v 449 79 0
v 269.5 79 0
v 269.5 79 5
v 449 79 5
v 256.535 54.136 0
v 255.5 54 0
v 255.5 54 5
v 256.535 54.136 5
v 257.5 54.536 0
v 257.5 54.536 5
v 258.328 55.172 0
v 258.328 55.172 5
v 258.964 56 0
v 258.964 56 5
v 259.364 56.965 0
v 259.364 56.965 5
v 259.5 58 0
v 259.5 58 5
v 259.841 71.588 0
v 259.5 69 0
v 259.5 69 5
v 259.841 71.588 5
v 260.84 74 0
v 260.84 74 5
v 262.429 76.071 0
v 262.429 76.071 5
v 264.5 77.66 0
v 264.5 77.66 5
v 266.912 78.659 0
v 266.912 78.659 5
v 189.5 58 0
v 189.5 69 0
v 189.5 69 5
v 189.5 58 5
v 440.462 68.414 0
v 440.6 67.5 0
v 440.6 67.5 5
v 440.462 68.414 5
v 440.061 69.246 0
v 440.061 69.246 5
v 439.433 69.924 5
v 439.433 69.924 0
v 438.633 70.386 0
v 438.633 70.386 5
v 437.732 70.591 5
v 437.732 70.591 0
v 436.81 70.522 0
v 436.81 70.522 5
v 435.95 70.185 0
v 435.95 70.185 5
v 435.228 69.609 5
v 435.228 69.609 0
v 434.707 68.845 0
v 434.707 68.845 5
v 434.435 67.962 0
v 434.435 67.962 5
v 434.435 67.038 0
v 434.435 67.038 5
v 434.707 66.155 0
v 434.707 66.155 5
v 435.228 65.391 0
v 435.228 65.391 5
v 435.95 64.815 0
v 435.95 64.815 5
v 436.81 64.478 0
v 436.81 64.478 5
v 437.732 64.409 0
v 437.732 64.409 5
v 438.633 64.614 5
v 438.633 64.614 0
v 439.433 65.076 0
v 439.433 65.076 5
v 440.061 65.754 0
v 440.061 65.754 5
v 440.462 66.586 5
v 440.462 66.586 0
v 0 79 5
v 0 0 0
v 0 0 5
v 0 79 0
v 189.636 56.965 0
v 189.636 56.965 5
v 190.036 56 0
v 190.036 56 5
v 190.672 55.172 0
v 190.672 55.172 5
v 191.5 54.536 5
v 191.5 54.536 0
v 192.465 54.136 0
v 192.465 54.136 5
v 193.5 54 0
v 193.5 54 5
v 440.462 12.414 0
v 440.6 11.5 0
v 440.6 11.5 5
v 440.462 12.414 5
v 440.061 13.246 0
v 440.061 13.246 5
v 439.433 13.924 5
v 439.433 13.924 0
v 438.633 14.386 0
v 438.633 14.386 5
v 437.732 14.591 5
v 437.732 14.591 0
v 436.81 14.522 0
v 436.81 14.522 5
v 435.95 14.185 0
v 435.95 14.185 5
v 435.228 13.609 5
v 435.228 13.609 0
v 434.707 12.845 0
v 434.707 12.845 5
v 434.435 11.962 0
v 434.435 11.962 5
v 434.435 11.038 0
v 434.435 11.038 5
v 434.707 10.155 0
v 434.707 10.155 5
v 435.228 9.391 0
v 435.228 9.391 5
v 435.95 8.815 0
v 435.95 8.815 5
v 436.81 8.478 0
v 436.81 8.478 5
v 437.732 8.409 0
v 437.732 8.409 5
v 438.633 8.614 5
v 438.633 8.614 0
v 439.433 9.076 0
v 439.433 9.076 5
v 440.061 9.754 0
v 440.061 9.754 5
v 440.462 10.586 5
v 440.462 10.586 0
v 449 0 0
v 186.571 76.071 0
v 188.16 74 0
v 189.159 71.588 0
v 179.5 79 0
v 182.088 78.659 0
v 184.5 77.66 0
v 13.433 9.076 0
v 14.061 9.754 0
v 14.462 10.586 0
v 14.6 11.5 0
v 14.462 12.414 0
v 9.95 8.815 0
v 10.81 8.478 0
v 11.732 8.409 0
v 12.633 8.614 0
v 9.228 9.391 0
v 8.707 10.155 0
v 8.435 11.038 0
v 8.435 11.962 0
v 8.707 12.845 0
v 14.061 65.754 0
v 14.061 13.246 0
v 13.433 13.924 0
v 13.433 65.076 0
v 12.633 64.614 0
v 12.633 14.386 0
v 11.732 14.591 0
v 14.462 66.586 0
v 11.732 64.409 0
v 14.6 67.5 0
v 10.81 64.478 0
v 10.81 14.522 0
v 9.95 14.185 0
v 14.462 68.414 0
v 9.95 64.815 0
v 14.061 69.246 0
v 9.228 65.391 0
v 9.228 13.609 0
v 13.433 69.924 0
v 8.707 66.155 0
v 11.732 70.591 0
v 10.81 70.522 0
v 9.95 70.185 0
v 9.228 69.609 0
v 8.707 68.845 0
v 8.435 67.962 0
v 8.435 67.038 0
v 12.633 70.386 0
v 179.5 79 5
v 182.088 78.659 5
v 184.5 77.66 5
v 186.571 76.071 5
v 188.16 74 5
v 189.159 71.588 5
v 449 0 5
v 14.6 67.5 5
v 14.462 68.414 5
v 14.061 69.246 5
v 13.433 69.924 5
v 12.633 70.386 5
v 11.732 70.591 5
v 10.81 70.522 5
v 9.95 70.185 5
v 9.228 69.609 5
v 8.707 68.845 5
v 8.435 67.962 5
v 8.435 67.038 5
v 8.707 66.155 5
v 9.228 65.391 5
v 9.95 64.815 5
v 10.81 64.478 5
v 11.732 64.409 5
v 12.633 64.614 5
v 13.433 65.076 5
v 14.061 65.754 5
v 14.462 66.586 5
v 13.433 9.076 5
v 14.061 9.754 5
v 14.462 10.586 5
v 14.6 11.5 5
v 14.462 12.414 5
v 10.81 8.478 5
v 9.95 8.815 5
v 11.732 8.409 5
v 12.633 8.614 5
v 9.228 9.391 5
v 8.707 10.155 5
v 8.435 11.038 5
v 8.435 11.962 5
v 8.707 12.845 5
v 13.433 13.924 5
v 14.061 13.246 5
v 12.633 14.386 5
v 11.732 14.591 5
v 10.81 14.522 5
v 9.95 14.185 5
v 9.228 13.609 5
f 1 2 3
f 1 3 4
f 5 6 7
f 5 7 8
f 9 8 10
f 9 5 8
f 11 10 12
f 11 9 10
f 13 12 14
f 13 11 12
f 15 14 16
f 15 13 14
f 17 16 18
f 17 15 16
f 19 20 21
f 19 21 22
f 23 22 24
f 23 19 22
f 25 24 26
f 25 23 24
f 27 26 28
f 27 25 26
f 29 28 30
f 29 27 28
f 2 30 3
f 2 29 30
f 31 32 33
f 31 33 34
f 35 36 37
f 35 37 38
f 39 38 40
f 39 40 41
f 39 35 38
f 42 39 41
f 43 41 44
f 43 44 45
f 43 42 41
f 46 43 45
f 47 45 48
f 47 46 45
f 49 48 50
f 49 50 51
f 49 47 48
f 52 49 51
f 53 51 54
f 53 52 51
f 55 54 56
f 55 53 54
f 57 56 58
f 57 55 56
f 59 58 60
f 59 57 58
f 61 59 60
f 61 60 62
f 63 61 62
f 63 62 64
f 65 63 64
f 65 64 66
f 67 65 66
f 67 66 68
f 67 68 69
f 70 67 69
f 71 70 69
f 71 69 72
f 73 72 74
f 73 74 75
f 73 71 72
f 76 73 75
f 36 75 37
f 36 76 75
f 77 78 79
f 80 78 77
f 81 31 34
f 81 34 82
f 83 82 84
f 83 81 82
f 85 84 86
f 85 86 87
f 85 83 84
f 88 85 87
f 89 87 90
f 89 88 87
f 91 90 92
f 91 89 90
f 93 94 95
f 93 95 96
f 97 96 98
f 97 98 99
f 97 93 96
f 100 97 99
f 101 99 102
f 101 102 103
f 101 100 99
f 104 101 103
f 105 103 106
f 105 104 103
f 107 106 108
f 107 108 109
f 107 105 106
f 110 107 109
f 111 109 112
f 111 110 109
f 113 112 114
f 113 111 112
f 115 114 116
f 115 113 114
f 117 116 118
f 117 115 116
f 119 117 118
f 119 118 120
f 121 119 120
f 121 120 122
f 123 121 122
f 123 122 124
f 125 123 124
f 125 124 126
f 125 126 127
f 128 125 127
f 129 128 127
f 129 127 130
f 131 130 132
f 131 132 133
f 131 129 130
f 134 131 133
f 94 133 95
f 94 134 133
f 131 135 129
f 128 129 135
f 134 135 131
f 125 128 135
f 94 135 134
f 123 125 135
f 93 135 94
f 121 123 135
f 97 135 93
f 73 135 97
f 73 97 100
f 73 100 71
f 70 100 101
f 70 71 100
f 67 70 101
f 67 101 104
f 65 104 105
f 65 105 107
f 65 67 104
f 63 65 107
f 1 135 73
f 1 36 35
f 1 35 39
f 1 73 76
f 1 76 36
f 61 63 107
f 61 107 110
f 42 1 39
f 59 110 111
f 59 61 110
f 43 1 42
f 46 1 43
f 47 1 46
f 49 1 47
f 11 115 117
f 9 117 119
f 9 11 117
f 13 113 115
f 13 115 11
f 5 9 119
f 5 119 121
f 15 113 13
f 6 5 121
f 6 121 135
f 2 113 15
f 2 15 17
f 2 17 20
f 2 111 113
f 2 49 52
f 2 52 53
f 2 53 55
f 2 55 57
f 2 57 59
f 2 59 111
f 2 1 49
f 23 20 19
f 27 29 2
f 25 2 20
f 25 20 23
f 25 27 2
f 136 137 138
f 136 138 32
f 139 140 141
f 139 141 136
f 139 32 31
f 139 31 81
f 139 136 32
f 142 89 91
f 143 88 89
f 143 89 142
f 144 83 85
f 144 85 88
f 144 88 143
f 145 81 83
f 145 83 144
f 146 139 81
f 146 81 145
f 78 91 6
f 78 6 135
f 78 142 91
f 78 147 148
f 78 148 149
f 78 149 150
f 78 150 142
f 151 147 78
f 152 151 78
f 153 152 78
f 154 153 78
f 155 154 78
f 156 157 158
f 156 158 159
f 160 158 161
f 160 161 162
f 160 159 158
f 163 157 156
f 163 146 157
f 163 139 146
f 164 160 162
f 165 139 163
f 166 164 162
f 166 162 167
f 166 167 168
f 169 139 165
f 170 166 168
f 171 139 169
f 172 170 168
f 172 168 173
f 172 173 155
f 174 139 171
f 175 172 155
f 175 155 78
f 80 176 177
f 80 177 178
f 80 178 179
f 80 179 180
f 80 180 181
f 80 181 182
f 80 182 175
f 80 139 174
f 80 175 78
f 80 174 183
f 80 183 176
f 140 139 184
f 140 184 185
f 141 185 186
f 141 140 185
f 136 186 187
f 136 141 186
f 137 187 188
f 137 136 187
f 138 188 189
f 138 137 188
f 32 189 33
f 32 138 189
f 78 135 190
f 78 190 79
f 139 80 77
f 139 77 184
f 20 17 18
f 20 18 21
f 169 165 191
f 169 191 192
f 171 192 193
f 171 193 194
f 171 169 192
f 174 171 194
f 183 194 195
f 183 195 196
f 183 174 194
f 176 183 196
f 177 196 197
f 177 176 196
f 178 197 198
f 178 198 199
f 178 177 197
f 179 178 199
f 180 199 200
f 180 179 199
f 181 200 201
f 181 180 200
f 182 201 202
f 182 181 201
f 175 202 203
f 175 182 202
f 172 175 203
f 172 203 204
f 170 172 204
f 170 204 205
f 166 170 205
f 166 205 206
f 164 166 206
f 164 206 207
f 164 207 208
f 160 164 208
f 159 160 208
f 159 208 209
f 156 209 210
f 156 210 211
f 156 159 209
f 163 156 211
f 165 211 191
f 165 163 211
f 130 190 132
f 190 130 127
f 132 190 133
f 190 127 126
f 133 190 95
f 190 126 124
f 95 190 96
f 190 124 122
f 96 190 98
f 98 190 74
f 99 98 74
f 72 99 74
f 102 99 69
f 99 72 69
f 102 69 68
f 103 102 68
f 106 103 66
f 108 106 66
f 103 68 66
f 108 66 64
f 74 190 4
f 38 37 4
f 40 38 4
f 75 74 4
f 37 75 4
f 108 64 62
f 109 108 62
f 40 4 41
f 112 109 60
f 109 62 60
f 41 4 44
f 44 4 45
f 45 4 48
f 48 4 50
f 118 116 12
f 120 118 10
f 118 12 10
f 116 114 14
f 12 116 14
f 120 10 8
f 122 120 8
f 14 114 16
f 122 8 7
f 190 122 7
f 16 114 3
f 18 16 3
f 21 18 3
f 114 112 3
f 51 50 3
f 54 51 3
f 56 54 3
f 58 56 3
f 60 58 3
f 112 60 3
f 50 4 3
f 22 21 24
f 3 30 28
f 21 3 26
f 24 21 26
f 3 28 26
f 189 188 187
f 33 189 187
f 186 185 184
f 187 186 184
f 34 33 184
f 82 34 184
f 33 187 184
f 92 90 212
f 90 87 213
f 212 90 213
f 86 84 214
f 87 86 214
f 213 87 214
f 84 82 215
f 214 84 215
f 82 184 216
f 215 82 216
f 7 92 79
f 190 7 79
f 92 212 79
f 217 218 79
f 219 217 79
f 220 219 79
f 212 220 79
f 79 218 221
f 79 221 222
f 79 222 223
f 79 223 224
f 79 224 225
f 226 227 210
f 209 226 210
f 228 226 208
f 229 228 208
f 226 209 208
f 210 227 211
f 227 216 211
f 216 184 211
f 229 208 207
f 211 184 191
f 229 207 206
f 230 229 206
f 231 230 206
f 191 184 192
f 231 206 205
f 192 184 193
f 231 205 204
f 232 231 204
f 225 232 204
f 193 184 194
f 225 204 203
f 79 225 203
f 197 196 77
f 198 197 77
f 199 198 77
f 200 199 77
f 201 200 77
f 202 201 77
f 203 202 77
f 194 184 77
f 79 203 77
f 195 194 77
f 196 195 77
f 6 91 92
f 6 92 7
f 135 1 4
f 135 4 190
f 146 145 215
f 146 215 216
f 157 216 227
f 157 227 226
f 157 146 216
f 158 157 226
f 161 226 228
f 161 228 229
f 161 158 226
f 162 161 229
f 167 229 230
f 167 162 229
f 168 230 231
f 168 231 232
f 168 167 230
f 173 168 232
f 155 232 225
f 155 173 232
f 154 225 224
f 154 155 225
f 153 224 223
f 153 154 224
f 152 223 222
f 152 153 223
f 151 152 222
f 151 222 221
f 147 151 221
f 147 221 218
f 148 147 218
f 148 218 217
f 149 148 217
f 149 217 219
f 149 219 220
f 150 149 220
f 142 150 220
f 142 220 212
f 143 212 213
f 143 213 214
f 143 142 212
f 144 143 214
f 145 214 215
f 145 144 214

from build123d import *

# Parameters (mm, degrees)
SKETCH_F_R                   = 3.1
ESTRUSIONE_ESTRUSIONE1_DEPTH = 5


with BuildPart() as part:
    # Sketch f → Estrusione-Estrusione1 (new body)
    with BuildSketch(Plane.XY):
        with BuildLine():
            Line((0, 0), (0, 79))
            Line((0, 79), (179.5, 79))
            ThreePointArc((179.5, 79), (186.571067812, 76.071067812), (189.5, 69))
            Line((189.5, 69), (189.5, 58))
            ThreePointArc((189.5, 58), (190.671572875, 55.171572875), (193.5, 54))
            Line((193.5, 54), (255.5, 54))
            ThreePointArc((255.5, 54), (258.328427125, 55.171572875), (259.5, 58))
            Line((259.5, 58), (259.5, 69))
            ThreePointArc((259.5, 69), (262.428932188, 76.071067812), (269.5, 79))
            Line((269.5, 79), (449, 79))
            Line((449, 79), (449, 0))
            Line((449, 0), (0, 0))
        make_face()
        with Locations((11.5, 67.5)):
            Circle(SKETCH_F_R, mode=Mode.SUBTRACT)
        with Locations((437.5, 67.5)):
            Circle(SKETCH_F_R, mode=Mode.SUBTRACT)
        with Locations((11.5, 11.5)):
            Circle(SKETCH_F_R, mode=Mode.SUBTRACT)
        with Locations((437.5, 11.5)):
            Circle(SKETCH_F_R, mode=Mode.SUBTRACT)
    extrude(amount=ESTRUSIONE_ESTRUSIONE1_DEPTH)


solid = part.part
